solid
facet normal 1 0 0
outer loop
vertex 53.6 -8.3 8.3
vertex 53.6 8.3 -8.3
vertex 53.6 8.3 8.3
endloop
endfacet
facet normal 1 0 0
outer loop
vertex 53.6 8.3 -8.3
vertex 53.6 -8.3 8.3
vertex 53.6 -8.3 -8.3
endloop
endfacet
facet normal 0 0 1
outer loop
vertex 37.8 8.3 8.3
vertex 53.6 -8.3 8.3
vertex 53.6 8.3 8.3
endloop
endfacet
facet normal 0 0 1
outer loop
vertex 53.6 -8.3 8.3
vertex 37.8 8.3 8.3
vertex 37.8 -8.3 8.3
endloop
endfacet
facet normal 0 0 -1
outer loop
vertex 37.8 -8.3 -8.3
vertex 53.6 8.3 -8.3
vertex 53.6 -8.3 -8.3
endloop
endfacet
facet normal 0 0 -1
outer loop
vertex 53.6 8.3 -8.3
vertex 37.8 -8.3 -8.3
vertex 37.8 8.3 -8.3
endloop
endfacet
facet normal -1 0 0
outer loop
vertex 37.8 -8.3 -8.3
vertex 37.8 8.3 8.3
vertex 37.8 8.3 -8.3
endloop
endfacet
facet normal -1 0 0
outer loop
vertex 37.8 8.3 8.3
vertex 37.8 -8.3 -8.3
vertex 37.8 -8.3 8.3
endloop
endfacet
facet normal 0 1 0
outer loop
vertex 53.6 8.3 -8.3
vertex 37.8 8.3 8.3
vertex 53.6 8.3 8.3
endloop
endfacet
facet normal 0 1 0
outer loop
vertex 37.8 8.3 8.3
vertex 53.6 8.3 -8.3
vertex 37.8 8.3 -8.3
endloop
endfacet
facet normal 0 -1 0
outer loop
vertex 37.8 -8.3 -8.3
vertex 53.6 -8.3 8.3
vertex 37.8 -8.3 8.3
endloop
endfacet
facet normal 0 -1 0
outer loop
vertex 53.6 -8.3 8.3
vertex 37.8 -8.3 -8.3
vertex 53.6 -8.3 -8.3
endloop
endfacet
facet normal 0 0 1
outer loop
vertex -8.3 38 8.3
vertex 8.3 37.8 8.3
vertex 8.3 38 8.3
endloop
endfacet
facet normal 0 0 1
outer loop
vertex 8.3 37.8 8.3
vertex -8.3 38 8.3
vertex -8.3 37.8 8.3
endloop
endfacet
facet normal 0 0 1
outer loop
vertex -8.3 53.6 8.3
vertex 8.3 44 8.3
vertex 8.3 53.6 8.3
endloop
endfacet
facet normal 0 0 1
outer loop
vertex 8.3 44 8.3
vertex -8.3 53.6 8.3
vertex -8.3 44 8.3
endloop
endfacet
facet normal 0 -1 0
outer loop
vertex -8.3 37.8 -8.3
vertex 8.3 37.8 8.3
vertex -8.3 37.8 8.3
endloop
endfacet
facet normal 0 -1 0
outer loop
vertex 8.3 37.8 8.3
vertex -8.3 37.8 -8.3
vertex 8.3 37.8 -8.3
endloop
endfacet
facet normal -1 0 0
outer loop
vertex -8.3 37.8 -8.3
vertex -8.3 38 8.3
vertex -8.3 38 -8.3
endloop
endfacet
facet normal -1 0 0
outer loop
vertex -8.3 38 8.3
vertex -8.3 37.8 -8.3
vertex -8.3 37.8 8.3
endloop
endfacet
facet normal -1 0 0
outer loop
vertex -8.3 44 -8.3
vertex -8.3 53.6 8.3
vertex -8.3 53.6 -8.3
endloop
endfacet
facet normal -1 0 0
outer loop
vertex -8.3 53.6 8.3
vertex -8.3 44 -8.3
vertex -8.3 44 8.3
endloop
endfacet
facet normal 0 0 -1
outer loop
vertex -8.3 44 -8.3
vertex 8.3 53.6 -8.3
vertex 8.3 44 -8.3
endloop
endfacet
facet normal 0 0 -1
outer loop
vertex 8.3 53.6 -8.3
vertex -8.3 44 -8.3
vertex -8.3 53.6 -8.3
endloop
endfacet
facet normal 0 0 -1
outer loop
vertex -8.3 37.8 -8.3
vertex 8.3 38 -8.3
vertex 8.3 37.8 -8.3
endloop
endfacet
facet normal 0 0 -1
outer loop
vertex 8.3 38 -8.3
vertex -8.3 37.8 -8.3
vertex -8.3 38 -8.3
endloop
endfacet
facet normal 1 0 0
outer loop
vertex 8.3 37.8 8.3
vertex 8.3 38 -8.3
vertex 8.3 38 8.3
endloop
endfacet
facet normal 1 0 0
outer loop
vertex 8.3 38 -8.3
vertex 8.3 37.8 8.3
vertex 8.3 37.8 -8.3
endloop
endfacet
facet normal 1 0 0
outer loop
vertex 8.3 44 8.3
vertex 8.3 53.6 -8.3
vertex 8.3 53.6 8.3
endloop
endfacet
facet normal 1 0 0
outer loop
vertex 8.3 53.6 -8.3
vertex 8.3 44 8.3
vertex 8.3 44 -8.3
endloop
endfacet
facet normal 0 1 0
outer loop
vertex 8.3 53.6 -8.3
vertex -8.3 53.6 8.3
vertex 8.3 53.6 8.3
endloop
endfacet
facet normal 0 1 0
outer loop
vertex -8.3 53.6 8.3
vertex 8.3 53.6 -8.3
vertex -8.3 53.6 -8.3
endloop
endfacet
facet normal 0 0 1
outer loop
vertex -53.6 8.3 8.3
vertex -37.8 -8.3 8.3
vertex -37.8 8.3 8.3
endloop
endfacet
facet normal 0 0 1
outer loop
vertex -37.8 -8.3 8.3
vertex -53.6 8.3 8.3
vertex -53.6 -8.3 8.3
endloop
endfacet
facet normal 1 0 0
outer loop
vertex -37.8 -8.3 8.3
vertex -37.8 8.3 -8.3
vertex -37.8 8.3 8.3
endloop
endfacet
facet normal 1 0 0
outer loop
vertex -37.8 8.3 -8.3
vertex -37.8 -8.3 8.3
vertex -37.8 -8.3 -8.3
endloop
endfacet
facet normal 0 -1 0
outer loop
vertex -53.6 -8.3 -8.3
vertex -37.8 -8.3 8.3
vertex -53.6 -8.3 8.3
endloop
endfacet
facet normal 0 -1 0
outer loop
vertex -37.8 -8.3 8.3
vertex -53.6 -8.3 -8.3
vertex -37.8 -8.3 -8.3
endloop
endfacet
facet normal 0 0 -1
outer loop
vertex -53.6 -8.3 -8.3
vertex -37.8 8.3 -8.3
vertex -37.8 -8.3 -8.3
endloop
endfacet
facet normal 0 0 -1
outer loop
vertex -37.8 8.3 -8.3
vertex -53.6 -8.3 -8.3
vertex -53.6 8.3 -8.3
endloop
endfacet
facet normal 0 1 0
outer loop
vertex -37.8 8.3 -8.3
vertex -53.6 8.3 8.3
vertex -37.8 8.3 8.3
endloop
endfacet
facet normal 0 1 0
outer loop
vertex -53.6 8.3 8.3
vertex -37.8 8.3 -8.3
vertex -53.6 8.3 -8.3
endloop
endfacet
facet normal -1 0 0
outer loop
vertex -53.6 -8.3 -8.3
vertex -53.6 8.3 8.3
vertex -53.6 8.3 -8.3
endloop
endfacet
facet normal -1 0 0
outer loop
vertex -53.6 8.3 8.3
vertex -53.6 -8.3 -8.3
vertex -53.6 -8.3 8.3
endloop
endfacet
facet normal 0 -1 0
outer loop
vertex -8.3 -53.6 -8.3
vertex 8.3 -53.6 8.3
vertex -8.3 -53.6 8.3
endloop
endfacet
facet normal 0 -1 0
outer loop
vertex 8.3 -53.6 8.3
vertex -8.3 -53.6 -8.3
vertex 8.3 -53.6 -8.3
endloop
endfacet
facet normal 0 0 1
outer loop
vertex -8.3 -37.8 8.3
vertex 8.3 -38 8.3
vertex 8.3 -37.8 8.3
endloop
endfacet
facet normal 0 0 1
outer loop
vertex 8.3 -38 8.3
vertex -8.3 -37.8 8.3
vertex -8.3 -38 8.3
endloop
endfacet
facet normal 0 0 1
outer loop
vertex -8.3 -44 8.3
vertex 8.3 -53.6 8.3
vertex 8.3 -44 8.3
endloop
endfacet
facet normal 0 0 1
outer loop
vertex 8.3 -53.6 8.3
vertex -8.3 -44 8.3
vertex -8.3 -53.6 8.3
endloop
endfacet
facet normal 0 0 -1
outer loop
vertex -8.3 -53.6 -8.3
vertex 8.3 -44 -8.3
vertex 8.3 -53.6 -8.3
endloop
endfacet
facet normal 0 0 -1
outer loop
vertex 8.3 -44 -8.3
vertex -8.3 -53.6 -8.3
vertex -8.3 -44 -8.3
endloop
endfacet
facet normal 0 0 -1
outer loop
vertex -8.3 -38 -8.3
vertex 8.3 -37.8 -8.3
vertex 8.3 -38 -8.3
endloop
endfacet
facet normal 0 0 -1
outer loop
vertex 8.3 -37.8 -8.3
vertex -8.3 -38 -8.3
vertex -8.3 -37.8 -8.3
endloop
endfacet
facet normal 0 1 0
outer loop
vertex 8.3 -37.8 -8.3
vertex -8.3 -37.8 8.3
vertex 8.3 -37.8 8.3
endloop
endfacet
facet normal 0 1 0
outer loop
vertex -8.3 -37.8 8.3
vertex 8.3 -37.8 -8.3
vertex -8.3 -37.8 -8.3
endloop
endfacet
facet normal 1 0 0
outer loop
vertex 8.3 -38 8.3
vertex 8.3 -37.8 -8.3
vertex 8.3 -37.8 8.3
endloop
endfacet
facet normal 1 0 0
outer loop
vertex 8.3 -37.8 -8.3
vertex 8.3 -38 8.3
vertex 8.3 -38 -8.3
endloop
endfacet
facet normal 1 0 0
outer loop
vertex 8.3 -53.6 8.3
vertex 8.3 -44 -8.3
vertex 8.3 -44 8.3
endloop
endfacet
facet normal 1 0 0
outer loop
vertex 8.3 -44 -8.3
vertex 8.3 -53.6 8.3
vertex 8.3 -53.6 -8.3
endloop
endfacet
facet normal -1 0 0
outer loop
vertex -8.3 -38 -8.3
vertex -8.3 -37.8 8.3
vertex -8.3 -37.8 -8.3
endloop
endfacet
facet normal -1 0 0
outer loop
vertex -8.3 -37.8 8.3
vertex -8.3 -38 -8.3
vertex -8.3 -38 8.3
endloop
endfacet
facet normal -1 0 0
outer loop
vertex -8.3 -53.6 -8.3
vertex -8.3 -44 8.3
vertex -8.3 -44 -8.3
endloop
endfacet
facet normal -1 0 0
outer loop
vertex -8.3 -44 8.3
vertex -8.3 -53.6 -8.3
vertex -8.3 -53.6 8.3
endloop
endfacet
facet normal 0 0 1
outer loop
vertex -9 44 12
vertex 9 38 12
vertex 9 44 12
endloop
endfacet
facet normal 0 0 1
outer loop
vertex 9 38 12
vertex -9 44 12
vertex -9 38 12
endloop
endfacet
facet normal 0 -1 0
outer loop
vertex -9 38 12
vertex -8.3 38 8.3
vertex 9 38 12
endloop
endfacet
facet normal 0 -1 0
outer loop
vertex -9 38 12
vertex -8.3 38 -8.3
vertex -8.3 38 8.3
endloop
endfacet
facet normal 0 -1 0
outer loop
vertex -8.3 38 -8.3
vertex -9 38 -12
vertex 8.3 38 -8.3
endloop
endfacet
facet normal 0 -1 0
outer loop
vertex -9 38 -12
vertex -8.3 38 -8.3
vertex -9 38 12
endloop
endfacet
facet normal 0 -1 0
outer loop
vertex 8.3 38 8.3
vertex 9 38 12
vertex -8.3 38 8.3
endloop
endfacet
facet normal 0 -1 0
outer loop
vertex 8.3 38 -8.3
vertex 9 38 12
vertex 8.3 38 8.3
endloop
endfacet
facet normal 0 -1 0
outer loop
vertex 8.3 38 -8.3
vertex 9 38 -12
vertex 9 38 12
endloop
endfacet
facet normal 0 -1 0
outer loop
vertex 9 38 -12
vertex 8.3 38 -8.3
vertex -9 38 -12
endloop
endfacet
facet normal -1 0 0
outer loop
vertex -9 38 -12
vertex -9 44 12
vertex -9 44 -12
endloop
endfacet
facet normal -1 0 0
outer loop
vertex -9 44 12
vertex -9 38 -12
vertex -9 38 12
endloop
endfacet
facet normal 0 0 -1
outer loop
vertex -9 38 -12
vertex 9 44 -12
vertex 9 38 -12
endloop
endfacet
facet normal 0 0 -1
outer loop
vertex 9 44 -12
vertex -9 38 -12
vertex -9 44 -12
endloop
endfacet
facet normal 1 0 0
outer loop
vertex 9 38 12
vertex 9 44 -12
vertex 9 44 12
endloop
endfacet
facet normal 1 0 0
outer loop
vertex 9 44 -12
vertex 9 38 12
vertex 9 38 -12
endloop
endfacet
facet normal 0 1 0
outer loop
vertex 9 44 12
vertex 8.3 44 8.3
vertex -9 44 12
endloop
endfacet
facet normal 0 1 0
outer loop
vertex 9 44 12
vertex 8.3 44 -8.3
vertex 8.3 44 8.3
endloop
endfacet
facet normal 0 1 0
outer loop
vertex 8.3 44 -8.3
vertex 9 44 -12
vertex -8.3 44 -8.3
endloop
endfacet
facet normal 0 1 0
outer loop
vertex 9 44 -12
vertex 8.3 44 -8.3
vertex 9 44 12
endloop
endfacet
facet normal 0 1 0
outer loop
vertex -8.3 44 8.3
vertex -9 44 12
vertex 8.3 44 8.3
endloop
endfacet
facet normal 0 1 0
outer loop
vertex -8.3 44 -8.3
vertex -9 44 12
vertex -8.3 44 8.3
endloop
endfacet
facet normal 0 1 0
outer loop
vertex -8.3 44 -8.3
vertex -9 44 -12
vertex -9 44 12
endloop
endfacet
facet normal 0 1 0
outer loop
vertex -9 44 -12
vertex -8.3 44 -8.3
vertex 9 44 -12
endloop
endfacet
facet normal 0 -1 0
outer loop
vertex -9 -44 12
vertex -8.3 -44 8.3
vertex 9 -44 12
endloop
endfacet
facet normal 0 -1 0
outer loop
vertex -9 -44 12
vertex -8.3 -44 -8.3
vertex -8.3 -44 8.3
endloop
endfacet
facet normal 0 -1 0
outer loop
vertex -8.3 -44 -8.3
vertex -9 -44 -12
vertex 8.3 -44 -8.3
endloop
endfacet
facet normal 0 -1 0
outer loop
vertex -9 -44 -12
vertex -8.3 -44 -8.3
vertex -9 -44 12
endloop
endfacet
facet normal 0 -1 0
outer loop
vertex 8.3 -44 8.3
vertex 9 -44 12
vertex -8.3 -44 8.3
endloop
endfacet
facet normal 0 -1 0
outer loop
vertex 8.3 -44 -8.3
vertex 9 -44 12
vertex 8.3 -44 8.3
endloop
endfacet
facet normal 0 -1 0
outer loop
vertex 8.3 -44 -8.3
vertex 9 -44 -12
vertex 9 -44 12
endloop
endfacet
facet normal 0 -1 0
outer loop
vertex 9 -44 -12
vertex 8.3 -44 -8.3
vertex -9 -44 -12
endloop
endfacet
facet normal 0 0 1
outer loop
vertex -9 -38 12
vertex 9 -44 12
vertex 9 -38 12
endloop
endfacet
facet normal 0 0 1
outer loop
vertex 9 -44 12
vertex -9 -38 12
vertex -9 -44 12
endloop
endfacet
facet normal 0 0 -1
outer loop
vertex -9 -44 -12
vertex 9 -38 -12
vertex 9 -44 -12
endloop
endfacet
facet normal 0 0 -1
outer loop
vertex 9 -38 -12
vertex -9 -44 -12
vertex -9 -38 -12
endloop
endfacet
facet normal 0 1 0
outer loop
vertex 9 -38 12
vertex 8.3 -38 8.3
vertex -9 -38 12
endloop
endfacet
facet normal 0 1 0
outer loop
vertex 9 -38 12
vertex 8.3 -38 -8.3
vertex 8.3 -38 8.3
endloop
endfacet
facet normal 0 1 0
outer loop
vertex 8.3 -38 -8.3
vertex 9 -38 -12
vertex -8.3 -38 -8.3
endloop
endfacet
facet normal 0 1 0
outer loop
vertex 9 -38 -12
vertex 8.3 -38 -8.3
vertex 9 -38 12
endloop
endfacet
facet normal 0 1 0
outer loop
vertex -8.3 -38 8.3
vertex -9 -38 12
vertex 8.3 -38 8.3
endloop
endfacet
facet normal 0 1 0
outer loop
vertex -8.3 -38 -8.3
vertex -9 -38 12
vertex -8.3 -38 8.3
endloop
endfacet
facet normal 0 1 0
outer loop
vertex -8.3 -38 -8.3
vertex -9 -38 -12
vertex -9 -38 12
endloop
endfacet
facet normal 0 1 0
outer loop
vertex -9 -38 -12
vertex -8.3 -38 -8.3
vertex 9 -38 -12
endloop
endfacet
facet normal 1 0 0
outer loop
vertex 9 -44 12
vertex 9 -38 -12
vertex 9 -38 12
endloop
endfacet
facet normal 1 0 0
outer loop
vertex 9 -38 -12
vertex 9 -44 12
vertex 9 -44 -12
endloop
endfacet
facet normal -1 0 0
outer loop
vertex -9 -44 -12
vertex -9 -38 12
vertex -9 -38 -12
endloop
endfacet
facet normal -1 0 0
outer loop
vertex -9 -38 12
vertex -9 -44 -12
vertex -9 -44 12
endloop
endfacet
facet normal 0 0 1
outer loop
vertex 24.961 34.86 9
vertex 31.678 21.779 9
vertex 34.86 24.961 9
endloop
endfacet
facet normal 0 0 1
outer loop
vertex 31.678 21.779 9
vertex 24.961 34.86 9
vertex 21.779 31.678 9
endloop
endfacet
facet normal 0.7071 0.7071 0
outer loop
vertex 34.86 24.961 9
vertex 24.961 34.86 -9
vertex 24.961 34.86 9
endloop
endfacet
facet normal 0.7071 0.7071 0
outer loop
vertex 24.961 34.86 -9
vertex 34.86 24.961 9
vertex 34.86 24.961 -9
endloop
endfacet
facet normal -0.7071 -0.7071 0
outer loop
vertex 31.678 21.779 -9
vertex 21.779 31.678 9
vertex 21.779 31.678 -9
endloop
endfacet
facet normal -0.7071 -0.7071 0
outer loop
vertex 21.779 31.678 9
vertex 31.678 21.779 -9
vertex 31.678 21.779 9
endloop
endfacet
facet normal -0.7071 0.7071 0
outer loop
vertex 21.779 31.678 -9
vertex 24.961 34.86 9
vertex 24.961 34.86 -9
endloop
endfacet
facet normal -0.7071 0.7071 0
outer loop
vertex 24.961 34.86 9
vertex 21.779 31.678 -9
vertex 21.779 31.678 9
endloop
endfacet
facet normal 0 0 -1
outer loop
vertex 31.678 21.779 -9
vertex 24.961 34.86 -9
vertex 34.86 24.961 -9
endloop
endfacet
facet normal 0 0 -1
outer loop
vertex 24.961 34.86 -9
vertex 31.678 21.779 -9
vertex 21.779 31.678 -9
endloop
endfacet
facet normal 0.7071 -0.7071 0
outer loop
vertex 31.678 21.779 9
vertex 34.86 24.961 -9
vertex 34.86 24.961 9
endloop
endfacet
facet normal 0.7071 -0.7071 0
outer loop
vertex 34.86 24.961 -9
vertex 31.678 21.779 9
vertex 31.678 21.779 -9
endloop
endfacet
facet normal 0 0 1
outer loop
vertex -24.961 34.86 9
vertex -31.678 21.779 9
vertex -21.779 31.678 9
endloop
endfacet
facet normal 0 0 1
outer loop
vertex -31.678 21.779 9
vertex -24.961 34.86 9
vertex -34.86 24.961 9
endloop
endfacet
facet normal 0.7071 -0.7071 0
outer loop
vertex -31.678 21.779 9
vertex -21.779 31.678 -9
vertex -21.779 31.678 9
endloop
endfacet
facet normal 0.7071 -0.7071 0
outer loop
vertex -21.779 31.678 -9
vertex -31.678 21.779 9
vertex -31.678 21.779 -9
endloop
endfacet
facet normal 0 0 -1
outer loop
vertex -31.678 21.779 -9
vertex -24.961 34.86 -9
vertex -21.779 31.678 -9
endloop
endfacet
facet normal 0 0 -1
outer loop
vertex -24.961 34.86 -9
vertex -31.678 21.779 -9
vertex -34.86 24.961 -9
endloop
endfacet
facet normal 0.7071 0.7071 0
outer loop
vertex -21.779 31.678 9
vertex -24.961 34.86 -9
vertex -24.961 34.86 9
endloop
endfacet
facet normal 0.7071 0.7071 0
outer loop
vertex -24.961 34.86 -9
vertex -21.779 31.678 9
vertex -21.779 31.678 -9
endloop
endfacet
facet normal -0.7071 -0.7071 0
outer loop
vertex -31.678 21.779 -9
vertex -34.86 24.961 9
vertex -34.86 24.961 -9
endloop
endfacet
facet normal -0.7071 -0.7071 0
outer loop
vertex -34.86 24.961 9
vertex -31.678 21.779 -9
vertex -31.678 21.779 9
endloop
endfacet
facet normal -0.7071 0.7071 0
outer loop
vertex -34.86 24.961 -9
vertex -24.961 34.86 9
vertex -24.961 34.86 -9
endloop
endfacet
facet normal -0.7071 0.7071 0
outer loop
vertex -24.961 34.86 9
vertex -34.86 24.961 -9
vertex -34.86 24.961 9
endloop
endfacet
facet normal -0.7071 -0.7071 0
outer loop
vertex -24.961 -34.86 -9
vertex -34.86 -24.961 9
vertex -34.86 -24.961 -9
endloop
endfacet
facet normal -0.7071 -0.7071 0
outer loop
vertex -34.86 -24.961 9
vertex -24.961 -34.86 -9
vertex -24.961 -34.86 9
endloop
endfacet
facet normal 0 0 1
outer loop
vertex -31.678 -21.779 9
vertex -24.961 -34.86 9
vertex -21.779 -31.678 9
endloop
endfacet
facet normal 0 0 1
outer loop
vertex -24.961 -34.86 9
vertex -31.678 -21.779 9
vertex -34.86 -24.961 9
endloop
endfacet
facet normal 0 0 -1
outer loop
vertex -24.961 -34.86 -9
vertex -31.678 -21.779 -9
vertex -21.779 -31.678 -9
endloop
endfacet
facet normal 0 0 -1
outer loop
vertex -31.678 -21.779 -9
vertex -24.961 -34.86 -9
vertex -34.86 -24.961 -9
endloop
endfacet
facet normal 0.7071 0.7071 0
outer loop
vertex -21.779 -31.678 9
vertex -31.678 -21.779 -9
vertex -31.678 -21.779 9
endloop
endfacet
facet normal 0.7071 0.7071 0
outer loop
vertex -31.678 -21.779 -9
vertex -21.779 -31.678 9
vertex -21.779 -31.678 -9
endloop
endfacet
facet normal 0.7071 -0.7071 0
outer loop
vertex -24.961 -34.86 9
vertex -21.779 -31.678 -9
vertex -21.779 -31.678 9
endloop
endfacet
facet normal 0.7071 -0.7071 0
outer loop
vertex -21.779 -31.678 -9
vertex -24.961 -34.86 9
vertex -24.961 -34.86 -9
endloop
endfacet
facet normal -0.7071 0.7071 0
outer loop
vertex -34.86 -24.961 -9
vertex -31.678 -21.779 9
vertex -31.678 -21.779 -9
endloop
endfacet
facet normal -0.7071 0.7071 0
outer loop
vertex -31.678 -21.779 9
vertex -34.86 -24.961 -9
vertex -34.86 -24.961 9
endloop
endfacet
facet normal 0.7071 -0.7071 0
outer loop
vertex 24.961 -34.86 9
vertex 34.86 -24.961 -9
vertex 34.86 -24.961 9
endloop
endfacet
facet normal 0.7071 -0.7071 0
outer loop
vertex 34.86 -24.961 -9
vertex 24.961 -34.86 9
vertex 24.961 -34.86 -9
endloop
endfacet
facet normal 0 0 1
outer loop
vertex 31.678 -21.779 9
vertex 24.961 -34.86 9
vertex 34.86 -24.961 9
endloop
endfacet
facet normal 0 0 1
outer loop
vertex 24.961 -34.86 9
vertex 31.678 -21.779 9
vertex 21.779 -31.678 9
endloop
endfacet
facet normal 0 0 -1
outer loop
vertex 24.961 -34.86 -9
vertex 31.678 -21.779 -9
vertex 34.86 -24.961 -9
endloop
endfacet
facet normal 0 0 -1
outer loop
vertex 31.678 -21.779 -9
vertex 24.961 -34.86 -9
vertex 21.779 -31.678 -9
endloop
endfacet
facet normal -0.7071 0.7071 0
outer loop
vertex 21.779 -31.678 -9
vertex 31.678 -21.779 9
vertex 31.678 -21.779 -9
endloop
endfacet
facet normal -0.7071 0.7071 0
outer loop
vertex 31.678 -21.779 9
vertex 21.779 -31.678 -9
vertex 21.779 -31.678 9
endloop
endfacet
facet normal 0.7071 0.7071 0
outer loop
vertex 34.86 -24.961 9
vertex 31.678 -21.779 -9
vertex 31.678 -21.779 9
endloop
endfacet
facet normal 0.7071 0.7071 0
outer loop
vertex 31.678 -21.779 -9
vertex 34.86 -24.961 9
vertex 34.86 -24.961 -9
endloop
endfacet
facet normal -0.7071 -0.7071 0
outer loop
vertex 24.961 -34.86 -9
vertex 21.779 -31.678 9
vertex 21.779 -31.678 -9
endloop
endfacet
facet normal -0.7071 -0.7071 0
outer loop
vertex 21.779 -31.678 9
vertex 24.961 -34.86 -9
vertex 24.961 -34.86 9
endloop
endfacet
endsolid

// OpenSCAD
/* BUDDY FILE 31 - COMPACT SYMMETRIC PACKAGING V2
Concept packaging generated from spherical-boundary constraints.
Not printable until real hardware dimensions are selected. */
$fn=100;
SHELL_ID=111; SHELL_R=55.5; DUCT_OD=74; DUCT_R=37; AIRWAY_R=35;
SERVICE_GAP=0.6;
CAM_INNER_R=37.8; CAM_D=15.8; CAM_W=16.6; CAM_H=16.6;
BAT_INNER_R=38.0; BAT_D=6.0; BAT_W=18.0; BAT_H=24.0;
PCB_INNER_R=37.8; PCB_D=4.5; PCB_W=14.0; PCB_H=18.0;
SHOW_REFS=true;
packaging_v2();
module packaging_v2(){
 if(SHOW_REFS){ %sphere(d=SHELL_ID); %cylinder(h=70,d=70,center=true); }
 for(a=[0:90:270]) rotate([0,0,a]) pod_v2(CAM_INNER_R,CAM_D,CAM_W,CAM_H,0);
 for(a=[90,270]) rotate([0,0,a]) pod_v2(BAT_INNER_R,BAT_D,BAT_W,BAT_H,0);
 for(a=[45,135,225,315]) rotate([0,0,a]) pod_v2(PCB_INNER_R,PCB_D,PCB_W,PCB_H,0);
}
module pod_v2(r,d,w,h,z){ translate([r+d/2,0,z]) cube([d,w,h],center=true); }
function shell_r(z)=sqrt(SHELL_R*SHELL_R-z*z);
function corner_r(r,d,w)=sqrt((r+d)*(r+d)+(w/2)*(w/2));
function clearance(r,d,w,h,z)=shell_r(abs(z)+h/2)-corner_r(r,d,w);
CAM_CLEAR=clearance(CAM_INNER_R,CAM_D,CAM_W,CAM_H,0);
BAT_CLEAR=clearance(BAT_INNER_R,BAT_D,BAT_W,BAT_H,0);
PCB_CLEAR=clearance(PCB_INNER_R,PCB_D,PCB_W,PCB_H,0);
assert(CAM_INNER_R-DUCT_R>=0.2,"camera/duct gap fail");
assert(BAT_INNER_R-DUCT_R>=0.2,"battery/duct gap fail");
assert(PCB_INNER_R-DUCT_R>=0.2,"PCB/duct gap fail");
assert(CAM_CLEAR>=0.2,"camera shell clearance fail");
assert(BAT_CLEAR>=0.2,"battery shell clearance fail");
assert(PCB_CLEAR>=0.2,"PCB shell clearance fail");
echo("PACKAGING V2 clearances camera/battery/PCB =",CAM_CLEAR,BAT_CLEAR,PCB_CLEAR);
echo("STATUS: geometric envelope concept only; hardware selection required.");
